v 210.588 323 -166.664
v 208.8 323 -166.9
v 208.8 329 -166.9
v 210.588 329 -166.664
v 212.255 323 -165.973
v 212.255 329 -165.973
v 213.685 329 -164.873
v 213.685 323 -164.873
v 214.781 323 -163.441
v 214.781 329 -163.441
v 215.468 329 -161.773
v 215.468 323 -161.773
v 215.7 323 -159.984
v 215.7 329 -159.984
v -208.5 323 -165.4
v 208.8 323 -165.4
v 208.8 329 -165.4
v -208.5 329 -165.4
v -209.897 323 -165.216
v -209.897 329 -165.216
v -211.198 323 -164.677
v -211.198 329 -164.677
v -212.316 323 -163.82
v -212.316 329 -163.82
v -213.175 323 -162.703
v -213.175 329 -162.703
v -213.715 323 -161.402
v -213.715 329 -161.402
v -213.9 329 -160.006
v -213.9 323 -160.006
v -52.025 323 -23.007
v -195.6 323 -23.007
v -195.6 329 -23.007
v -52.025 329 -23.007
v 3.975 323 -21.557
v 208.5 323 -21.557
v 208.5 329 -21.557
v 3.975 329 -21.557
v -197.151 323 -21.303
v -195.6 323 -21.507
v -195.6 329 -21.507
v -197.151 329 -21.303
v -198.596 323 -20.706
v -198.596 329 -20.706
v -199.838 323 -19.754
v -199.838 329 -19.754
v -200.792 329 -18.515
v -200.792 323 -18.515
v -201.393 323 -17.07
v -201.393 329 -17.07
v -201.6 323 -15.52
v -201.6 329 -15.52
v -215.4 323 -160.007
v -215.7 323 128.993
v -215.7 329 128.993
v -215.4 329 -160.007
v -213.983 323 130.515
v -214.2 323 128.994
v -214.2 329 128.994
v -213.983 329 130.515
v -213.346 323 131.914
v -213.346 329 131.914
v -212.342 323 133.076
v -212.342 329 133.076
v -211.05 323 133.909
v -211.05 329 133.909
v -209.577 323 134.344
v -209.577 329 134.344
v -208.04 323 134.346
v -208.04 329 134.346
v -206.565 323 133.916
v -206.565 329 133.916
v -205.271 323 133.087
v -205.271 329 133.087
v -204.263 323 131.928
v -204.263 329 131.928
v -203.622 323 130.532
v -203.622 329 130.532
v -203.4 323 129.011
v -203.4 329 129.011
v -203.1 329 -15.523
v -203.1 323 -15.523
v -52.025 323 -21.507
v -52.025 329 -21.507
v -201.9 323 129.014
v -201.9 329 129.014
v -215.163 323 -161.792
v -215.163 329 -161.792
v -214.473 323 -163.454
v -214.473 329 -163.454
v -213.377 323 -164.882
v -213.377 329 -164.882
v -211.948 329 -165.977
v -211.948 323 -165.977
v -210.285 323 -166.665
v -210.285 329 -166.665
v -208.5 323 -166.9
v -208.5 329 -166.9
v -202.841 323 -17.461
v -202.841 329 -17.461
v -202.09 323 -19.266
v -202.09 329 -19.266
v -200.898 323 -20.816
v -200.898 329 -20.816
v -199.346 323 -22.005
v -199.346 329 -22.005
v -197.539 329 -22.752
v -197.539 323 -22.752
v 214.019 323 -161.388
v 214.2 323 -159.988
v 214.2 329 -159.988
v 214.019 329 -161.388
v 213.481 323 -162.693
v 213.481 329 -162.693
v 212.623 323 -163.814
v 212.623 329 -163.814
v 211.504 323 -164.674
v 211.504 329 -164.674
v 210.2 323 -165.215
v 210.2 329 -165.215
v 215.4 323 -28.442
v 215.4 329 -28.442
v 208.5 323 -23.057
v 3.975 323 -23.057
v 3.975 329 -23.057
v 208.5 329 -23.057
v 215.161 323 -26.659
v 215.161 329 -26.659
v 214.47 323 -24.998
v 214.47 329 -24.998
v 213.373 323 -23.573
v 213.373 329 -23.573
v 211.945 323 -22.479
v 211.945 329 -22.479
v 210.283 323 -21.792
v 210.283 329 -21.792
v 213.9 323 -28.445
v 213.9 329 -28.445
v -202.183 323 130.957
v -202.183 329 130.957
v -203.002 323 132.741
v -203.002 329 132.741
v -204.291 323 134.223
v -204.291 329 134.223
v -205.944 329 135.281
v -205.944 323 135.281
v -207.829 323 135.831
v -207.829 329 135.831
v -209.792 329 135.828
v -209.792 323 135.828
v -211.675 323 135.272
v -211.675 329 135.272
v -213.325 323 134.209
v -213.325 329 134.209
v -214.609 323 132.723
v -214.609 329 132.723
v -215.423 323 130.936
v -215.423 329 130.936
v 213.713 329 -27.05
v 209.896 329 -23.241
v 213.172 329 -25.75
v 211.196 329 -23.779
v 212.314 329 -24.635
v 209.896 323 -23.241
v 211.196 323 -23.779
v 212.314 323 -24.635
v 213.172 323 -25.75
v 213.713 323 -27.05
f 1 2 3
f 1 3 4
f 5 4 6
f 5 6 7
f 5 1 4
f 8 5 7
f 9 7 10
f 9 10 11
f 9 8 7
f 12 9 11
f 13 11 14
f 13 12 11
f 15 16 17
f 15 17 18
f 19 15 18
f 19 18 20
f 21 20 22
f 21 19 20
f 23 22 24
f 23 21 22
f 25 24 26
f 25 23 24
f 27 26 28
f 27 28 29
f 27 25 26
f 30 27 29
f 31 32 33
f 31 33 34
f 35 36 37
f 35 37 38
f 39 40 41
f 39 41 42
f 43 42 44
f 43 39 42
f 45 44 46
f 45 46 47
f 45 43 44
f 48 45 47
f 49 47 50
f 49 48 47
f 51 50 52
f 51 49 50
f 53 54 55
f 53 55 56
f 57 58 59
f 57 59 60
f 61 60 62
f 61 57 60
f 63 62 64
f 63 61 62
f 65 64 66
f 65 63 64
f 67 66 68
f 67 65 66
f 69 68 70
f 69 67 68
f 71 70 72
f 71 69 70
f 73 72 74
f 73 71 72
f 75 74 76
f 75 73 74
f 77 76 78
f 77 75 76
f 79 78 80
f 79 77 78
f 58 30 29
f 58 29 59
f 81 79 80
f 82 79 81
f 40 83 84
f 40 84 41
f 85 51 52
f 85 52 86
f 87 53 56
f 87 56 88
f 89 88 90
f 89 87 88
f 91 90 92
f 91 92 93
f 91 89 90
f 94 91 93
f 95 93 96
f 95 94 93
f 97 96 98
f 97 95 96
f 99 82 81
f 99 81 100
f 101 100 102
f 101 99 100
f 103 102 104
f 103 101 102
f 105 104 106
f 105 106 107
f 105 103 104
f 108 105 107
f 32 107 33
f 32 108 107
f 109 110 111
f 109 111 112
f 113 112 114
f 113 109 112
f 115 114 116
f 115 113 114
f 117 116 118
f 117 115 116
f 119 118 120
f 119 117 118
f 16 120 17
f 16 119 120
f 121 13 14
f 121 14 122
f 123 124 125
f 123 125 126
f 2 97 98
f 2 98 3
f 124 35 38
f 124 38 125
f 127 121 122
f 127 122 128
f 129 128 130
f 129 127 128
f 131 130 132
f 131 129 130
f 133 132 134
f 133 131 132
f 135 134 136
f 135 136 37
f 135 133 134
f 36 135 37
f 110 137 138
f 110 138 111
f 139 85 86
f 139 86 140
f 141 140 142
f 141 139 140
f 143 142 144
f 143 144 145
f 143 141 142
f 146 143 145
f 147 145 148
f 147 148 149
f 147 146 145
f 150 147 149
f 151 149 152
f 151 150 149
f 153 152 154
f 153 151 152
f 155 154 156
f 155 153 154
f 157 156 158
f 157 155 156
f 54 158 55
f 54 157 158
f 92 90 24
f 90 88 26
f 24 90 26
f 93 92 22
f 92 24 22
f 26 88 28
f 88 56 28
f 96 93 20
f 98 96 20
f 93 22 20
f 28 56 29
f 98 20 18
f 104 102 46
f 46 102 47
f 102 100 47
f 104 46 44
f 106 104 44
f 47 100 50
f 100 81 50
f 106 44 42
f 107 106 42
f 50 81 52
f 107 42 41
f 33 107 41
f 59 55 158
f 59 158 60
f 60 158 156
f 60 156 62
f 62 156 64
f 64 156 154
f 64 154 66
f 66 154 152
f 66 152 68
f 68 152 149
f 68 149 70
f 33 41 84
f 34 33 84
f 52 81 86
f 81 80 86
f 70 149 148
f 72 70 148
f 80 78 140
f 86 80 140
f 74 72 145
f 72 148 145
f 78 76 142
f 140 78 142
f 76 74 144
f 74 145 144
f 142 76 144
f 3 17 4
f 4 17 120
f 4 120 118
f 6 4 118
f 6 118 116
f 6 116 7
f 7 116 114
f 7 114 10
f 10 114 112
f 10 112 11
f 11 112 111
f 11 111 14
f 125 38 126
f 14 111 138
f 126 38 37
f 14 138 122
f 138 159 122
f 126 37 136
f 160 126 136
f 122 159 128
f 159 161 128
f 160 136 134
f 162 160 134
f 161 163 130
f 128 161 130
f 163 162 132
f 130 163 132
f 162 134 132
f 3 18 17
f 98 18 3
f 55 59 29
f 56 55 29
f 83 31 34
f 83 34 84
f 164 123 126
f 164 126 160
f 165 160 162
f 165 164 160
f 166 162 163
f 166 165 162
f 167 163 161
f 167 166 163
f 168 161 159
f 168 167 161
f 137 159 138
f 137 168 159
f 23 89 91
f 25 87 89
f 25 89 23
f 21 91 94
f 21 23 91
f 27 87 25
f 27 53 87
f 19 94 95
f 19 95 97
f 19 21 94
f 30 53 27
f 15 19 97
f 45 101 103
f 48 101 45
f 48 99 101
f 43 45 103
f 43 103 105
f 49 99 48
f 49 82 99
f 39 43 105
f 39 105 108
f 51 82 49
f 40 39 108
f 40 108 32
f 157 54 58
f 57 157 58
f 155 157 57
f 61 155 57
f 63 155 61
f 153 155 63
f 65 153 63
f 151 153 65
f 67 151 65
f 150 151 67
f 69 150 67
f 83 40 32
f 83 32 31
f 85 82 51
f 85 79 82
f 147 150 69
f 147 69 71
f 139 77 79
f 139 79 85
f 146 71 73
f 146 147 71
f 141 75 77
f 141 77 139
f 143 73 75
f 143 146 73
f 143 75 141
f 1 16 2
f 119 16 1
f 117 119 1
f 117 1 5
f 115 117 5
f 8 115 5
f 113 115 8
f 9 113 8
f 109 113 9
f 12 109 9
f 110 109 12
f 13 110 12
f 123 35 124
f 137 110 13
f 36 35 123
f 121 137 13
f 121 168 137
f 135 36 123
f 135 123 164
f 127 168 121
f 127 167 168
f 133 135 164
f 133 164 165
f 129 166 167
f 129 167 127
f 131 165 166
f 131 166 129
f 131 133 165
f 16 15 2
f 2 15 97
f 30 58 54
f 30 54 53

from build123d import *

# Parameters (mm, degrees)
BOSS_EXTRUDE1_DEPTH = 6


with BuildPart() as part:
    # Sketch1 → Boss-Extrude1 (new body)
    with BuildSketch(Plane.XZ.offset(-323)):
        with BuildLine():
            Line((-52.025054896, -21.507337011), (-195.6, -21.507337011))
            ThreePointArc((-195.6, -21.507337011), (-199.838234915, -19.754378899), (-201.599987073, -15.519791945))
            Line((-201.599987073, -15.519791945), (-201.900014866, 129.014323174))
            ThreePointArc((-201.900014866, 129.014323174), (-208.810742902, 135.899991637), (-215.699996282, 128.992837374))
            Line((-215.699996282, 128.992837374), (-215.399996282, -160.007162626))
            ThreePointArc((-215.399996282, -160.007162626), (-213.376503762, -164.881568504), (-208.5, -166.9))
            Line((-208.5, -166.9), (208.8, -166.9))
            ThreePointArc((208.8, -166.9), (213.684597243, -164.873469993), (215.699982056, -159.984263701))
            Line((215.699982056, -159.984263701), (215.399982056, -28.441600712))
            ThreePointArc((215.399982056, -28.441600712), (213.373469993, -23.572739768), (208.5, -21.557337011))
            Line((208.5, -21.557337011), (3.974945104, -21.557337011))
            Line((3.974945104, -21.557337011), (3.974945104, -23.057337011))
            Line((3.974945104, -23.057337011), (208.5, -23.057337011))
            ThreePointArc((208.5, -23.057337011), (212.314019994, -24.634608733), (213.899985957, -28.445021647))
            Line((213.899985957, -28.445021647), (214.199985957, -159.987684636))
            ThreePointArc((214.199985957, -159.987684636), (212.622728277, -163.814019994), (208.8, -165.4))
            Line((208.8, -165.4), (-208.5, -165.4))
            ThreePointArc((-208.5, -165.4), (-212.316394249, -163.82035796), (-213.899997091, -160.005605533))
            Line((-213.899997091, -160.005605533), (-214.199997091, 128.994394467))
            ThreePointArc((-214.199997091, 128.994394467), (-208.808407488, 134.399993455), (-203.400011634, 129.011209441))
            Line((-203.400011634, 129.011209441), (-203.099983841, -15.522905679))
            ThreePointArc((-203.099983841, -15.522905679), (-200.897793644, -20.816139371), (-195.6, -23.007337011))
            Line((-195.6, -23.007337011), (-52.025054896, -23.007337011))
            Line((-52.025054896, -23.007337011), (-52.025054896, -21.507337011))
        make_face()
    extrude(amount=-BOSS_EXTRUDE1_DEPTH)


solid = part.part
